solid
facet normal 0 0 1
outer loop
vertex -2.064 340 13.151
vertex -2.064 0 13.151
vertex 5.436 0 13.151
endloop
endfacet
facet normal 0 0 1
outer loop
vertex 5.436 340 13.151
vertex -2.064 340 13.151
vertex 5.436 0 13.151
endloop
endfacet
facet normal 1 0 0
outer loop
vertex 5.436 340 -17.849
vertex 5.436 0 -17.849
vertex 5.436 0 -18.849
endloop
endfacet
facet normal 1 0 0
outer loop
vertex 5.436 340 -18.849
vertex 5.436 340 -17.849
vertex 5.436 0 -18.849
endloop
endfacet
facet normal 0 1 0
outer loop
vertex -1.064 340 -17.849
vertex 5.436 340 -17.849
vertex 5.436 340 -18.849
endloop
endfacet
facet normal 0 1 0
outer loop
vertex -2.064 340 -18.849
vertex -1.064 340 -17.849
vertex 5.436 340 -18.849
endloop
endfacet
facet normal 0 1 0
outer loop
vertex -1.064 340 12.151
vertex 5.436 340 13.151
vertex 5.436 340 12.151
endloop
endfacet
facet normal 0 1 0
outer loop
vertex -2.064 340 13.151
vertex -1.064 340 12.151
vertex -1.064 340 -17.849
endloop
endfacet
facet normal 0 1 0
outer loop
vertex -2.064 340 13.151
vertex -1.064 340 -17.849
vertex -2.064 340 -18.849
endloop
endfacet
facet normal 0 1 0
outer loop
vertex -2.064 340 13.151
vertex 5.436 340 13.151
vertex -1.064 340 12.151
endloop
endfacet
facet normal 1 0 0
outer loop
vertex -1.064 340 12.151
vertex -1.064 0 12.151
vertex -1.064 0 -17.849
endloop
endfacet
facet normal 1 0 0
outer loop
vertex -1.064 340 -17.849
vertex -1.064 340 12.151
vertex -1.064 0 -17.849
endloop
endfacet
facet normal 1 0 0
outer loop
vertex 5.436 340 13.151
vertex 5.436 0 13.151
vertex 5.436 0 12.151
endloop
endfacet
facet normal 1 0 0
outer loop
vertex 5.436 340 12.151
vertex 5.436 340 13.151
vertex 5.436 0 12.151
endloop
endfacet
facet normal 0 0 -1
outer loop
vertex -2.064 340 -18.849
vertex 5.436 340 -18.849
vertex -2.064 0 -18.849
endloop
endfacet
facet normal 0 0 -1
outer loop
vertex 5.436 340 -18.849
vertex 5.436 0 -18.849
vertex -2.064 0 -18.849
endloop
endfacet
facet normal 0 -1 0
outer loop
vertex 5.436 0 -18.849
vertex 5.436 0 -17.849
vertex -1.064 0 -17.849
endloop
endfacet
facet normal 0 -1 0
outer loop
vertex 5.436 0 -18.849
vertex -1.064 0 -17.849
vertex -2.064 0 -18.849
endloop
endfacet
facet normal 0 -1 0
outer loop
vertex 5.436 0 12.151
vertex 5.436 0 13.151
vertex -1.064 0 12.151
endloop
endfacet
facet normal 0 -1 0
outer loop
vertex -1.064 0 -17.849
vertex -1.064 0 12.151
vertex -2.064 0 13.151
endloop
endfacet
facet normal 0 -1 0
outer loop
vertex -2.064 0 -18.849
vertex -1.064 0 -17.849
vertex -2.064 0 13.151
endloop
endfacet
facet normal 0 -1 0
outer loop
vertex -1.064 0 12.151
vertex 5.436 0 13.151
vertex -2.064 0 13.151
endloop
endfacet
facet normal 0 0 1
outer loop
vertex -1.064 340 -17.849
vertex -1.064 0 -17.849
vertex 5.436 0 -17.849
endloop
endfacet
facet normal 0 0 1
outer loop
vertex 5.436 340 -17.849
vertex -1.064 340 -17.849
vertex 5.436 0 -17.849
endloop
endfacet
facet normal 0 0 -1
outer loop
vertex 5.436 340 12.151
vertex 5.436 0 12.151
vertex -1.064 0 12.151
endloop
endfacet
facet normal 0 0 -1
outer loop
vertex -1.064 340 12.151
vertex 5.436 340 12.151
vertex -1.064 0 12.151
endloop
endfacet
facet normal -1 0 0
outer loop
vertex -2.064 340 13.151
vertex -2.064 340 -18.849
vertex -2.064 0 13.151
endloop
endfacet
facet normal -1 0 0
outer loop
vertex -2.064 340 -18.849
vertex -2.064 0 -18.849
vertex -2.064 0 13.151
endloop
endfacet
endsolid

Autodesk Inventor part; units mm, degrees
ref_plane "YZ Plane" through (0, 0, 0) normal (1, 0, 0) x (0, 1, 0)
ref_plane "XZ Plane" through (0, 0, 0) normal (0, 1, 0) x (-1, 0, 0)
ref_plane "XY Plane" through (0, 0, 0) normal (0, 0, 1) x (1, 0, 0)
sketch "Boceto1" plane through (0, 0, 0) normal (0, 1, 0) x (-1, 0, 0)
  line L0 (-5.4361, 12.1513) -> (1.0639, 12.1513)
  line L1 (1.0639, 12.1513) -> (1.0639, -17.8487)
  line L2 (1.0639, -17.8487) -> (-5.4361, -17.8487)
  line L3 (-5.4361, -17.8487) -> (-5.4361, -18.8487)
  line L4 (-5.4361, -18.8487) -> (2.0639, -18.8487)
  line L5 (2.0639, -18.8487) -> (2.0639, 13.1513)
  line L6 (2.0639, 13.1513) -> (-5.4361, 13.1513)
  line L7 (-5.4361, 13.1513) -> (-5.4361, 12.1513)
  point P0 (0, 0)
  point P1 (0, 0)
  dimension "d0" = 6.5
  dimension "d1" = 30
  dimension "d2" = 1
  dimension "d3" = 7.5
  dimension "d4" = 32
extrude "Extrusión1" add sketch "Boceto1" along normal blind 340
properties part number "Tapa cable canal 340mm"
